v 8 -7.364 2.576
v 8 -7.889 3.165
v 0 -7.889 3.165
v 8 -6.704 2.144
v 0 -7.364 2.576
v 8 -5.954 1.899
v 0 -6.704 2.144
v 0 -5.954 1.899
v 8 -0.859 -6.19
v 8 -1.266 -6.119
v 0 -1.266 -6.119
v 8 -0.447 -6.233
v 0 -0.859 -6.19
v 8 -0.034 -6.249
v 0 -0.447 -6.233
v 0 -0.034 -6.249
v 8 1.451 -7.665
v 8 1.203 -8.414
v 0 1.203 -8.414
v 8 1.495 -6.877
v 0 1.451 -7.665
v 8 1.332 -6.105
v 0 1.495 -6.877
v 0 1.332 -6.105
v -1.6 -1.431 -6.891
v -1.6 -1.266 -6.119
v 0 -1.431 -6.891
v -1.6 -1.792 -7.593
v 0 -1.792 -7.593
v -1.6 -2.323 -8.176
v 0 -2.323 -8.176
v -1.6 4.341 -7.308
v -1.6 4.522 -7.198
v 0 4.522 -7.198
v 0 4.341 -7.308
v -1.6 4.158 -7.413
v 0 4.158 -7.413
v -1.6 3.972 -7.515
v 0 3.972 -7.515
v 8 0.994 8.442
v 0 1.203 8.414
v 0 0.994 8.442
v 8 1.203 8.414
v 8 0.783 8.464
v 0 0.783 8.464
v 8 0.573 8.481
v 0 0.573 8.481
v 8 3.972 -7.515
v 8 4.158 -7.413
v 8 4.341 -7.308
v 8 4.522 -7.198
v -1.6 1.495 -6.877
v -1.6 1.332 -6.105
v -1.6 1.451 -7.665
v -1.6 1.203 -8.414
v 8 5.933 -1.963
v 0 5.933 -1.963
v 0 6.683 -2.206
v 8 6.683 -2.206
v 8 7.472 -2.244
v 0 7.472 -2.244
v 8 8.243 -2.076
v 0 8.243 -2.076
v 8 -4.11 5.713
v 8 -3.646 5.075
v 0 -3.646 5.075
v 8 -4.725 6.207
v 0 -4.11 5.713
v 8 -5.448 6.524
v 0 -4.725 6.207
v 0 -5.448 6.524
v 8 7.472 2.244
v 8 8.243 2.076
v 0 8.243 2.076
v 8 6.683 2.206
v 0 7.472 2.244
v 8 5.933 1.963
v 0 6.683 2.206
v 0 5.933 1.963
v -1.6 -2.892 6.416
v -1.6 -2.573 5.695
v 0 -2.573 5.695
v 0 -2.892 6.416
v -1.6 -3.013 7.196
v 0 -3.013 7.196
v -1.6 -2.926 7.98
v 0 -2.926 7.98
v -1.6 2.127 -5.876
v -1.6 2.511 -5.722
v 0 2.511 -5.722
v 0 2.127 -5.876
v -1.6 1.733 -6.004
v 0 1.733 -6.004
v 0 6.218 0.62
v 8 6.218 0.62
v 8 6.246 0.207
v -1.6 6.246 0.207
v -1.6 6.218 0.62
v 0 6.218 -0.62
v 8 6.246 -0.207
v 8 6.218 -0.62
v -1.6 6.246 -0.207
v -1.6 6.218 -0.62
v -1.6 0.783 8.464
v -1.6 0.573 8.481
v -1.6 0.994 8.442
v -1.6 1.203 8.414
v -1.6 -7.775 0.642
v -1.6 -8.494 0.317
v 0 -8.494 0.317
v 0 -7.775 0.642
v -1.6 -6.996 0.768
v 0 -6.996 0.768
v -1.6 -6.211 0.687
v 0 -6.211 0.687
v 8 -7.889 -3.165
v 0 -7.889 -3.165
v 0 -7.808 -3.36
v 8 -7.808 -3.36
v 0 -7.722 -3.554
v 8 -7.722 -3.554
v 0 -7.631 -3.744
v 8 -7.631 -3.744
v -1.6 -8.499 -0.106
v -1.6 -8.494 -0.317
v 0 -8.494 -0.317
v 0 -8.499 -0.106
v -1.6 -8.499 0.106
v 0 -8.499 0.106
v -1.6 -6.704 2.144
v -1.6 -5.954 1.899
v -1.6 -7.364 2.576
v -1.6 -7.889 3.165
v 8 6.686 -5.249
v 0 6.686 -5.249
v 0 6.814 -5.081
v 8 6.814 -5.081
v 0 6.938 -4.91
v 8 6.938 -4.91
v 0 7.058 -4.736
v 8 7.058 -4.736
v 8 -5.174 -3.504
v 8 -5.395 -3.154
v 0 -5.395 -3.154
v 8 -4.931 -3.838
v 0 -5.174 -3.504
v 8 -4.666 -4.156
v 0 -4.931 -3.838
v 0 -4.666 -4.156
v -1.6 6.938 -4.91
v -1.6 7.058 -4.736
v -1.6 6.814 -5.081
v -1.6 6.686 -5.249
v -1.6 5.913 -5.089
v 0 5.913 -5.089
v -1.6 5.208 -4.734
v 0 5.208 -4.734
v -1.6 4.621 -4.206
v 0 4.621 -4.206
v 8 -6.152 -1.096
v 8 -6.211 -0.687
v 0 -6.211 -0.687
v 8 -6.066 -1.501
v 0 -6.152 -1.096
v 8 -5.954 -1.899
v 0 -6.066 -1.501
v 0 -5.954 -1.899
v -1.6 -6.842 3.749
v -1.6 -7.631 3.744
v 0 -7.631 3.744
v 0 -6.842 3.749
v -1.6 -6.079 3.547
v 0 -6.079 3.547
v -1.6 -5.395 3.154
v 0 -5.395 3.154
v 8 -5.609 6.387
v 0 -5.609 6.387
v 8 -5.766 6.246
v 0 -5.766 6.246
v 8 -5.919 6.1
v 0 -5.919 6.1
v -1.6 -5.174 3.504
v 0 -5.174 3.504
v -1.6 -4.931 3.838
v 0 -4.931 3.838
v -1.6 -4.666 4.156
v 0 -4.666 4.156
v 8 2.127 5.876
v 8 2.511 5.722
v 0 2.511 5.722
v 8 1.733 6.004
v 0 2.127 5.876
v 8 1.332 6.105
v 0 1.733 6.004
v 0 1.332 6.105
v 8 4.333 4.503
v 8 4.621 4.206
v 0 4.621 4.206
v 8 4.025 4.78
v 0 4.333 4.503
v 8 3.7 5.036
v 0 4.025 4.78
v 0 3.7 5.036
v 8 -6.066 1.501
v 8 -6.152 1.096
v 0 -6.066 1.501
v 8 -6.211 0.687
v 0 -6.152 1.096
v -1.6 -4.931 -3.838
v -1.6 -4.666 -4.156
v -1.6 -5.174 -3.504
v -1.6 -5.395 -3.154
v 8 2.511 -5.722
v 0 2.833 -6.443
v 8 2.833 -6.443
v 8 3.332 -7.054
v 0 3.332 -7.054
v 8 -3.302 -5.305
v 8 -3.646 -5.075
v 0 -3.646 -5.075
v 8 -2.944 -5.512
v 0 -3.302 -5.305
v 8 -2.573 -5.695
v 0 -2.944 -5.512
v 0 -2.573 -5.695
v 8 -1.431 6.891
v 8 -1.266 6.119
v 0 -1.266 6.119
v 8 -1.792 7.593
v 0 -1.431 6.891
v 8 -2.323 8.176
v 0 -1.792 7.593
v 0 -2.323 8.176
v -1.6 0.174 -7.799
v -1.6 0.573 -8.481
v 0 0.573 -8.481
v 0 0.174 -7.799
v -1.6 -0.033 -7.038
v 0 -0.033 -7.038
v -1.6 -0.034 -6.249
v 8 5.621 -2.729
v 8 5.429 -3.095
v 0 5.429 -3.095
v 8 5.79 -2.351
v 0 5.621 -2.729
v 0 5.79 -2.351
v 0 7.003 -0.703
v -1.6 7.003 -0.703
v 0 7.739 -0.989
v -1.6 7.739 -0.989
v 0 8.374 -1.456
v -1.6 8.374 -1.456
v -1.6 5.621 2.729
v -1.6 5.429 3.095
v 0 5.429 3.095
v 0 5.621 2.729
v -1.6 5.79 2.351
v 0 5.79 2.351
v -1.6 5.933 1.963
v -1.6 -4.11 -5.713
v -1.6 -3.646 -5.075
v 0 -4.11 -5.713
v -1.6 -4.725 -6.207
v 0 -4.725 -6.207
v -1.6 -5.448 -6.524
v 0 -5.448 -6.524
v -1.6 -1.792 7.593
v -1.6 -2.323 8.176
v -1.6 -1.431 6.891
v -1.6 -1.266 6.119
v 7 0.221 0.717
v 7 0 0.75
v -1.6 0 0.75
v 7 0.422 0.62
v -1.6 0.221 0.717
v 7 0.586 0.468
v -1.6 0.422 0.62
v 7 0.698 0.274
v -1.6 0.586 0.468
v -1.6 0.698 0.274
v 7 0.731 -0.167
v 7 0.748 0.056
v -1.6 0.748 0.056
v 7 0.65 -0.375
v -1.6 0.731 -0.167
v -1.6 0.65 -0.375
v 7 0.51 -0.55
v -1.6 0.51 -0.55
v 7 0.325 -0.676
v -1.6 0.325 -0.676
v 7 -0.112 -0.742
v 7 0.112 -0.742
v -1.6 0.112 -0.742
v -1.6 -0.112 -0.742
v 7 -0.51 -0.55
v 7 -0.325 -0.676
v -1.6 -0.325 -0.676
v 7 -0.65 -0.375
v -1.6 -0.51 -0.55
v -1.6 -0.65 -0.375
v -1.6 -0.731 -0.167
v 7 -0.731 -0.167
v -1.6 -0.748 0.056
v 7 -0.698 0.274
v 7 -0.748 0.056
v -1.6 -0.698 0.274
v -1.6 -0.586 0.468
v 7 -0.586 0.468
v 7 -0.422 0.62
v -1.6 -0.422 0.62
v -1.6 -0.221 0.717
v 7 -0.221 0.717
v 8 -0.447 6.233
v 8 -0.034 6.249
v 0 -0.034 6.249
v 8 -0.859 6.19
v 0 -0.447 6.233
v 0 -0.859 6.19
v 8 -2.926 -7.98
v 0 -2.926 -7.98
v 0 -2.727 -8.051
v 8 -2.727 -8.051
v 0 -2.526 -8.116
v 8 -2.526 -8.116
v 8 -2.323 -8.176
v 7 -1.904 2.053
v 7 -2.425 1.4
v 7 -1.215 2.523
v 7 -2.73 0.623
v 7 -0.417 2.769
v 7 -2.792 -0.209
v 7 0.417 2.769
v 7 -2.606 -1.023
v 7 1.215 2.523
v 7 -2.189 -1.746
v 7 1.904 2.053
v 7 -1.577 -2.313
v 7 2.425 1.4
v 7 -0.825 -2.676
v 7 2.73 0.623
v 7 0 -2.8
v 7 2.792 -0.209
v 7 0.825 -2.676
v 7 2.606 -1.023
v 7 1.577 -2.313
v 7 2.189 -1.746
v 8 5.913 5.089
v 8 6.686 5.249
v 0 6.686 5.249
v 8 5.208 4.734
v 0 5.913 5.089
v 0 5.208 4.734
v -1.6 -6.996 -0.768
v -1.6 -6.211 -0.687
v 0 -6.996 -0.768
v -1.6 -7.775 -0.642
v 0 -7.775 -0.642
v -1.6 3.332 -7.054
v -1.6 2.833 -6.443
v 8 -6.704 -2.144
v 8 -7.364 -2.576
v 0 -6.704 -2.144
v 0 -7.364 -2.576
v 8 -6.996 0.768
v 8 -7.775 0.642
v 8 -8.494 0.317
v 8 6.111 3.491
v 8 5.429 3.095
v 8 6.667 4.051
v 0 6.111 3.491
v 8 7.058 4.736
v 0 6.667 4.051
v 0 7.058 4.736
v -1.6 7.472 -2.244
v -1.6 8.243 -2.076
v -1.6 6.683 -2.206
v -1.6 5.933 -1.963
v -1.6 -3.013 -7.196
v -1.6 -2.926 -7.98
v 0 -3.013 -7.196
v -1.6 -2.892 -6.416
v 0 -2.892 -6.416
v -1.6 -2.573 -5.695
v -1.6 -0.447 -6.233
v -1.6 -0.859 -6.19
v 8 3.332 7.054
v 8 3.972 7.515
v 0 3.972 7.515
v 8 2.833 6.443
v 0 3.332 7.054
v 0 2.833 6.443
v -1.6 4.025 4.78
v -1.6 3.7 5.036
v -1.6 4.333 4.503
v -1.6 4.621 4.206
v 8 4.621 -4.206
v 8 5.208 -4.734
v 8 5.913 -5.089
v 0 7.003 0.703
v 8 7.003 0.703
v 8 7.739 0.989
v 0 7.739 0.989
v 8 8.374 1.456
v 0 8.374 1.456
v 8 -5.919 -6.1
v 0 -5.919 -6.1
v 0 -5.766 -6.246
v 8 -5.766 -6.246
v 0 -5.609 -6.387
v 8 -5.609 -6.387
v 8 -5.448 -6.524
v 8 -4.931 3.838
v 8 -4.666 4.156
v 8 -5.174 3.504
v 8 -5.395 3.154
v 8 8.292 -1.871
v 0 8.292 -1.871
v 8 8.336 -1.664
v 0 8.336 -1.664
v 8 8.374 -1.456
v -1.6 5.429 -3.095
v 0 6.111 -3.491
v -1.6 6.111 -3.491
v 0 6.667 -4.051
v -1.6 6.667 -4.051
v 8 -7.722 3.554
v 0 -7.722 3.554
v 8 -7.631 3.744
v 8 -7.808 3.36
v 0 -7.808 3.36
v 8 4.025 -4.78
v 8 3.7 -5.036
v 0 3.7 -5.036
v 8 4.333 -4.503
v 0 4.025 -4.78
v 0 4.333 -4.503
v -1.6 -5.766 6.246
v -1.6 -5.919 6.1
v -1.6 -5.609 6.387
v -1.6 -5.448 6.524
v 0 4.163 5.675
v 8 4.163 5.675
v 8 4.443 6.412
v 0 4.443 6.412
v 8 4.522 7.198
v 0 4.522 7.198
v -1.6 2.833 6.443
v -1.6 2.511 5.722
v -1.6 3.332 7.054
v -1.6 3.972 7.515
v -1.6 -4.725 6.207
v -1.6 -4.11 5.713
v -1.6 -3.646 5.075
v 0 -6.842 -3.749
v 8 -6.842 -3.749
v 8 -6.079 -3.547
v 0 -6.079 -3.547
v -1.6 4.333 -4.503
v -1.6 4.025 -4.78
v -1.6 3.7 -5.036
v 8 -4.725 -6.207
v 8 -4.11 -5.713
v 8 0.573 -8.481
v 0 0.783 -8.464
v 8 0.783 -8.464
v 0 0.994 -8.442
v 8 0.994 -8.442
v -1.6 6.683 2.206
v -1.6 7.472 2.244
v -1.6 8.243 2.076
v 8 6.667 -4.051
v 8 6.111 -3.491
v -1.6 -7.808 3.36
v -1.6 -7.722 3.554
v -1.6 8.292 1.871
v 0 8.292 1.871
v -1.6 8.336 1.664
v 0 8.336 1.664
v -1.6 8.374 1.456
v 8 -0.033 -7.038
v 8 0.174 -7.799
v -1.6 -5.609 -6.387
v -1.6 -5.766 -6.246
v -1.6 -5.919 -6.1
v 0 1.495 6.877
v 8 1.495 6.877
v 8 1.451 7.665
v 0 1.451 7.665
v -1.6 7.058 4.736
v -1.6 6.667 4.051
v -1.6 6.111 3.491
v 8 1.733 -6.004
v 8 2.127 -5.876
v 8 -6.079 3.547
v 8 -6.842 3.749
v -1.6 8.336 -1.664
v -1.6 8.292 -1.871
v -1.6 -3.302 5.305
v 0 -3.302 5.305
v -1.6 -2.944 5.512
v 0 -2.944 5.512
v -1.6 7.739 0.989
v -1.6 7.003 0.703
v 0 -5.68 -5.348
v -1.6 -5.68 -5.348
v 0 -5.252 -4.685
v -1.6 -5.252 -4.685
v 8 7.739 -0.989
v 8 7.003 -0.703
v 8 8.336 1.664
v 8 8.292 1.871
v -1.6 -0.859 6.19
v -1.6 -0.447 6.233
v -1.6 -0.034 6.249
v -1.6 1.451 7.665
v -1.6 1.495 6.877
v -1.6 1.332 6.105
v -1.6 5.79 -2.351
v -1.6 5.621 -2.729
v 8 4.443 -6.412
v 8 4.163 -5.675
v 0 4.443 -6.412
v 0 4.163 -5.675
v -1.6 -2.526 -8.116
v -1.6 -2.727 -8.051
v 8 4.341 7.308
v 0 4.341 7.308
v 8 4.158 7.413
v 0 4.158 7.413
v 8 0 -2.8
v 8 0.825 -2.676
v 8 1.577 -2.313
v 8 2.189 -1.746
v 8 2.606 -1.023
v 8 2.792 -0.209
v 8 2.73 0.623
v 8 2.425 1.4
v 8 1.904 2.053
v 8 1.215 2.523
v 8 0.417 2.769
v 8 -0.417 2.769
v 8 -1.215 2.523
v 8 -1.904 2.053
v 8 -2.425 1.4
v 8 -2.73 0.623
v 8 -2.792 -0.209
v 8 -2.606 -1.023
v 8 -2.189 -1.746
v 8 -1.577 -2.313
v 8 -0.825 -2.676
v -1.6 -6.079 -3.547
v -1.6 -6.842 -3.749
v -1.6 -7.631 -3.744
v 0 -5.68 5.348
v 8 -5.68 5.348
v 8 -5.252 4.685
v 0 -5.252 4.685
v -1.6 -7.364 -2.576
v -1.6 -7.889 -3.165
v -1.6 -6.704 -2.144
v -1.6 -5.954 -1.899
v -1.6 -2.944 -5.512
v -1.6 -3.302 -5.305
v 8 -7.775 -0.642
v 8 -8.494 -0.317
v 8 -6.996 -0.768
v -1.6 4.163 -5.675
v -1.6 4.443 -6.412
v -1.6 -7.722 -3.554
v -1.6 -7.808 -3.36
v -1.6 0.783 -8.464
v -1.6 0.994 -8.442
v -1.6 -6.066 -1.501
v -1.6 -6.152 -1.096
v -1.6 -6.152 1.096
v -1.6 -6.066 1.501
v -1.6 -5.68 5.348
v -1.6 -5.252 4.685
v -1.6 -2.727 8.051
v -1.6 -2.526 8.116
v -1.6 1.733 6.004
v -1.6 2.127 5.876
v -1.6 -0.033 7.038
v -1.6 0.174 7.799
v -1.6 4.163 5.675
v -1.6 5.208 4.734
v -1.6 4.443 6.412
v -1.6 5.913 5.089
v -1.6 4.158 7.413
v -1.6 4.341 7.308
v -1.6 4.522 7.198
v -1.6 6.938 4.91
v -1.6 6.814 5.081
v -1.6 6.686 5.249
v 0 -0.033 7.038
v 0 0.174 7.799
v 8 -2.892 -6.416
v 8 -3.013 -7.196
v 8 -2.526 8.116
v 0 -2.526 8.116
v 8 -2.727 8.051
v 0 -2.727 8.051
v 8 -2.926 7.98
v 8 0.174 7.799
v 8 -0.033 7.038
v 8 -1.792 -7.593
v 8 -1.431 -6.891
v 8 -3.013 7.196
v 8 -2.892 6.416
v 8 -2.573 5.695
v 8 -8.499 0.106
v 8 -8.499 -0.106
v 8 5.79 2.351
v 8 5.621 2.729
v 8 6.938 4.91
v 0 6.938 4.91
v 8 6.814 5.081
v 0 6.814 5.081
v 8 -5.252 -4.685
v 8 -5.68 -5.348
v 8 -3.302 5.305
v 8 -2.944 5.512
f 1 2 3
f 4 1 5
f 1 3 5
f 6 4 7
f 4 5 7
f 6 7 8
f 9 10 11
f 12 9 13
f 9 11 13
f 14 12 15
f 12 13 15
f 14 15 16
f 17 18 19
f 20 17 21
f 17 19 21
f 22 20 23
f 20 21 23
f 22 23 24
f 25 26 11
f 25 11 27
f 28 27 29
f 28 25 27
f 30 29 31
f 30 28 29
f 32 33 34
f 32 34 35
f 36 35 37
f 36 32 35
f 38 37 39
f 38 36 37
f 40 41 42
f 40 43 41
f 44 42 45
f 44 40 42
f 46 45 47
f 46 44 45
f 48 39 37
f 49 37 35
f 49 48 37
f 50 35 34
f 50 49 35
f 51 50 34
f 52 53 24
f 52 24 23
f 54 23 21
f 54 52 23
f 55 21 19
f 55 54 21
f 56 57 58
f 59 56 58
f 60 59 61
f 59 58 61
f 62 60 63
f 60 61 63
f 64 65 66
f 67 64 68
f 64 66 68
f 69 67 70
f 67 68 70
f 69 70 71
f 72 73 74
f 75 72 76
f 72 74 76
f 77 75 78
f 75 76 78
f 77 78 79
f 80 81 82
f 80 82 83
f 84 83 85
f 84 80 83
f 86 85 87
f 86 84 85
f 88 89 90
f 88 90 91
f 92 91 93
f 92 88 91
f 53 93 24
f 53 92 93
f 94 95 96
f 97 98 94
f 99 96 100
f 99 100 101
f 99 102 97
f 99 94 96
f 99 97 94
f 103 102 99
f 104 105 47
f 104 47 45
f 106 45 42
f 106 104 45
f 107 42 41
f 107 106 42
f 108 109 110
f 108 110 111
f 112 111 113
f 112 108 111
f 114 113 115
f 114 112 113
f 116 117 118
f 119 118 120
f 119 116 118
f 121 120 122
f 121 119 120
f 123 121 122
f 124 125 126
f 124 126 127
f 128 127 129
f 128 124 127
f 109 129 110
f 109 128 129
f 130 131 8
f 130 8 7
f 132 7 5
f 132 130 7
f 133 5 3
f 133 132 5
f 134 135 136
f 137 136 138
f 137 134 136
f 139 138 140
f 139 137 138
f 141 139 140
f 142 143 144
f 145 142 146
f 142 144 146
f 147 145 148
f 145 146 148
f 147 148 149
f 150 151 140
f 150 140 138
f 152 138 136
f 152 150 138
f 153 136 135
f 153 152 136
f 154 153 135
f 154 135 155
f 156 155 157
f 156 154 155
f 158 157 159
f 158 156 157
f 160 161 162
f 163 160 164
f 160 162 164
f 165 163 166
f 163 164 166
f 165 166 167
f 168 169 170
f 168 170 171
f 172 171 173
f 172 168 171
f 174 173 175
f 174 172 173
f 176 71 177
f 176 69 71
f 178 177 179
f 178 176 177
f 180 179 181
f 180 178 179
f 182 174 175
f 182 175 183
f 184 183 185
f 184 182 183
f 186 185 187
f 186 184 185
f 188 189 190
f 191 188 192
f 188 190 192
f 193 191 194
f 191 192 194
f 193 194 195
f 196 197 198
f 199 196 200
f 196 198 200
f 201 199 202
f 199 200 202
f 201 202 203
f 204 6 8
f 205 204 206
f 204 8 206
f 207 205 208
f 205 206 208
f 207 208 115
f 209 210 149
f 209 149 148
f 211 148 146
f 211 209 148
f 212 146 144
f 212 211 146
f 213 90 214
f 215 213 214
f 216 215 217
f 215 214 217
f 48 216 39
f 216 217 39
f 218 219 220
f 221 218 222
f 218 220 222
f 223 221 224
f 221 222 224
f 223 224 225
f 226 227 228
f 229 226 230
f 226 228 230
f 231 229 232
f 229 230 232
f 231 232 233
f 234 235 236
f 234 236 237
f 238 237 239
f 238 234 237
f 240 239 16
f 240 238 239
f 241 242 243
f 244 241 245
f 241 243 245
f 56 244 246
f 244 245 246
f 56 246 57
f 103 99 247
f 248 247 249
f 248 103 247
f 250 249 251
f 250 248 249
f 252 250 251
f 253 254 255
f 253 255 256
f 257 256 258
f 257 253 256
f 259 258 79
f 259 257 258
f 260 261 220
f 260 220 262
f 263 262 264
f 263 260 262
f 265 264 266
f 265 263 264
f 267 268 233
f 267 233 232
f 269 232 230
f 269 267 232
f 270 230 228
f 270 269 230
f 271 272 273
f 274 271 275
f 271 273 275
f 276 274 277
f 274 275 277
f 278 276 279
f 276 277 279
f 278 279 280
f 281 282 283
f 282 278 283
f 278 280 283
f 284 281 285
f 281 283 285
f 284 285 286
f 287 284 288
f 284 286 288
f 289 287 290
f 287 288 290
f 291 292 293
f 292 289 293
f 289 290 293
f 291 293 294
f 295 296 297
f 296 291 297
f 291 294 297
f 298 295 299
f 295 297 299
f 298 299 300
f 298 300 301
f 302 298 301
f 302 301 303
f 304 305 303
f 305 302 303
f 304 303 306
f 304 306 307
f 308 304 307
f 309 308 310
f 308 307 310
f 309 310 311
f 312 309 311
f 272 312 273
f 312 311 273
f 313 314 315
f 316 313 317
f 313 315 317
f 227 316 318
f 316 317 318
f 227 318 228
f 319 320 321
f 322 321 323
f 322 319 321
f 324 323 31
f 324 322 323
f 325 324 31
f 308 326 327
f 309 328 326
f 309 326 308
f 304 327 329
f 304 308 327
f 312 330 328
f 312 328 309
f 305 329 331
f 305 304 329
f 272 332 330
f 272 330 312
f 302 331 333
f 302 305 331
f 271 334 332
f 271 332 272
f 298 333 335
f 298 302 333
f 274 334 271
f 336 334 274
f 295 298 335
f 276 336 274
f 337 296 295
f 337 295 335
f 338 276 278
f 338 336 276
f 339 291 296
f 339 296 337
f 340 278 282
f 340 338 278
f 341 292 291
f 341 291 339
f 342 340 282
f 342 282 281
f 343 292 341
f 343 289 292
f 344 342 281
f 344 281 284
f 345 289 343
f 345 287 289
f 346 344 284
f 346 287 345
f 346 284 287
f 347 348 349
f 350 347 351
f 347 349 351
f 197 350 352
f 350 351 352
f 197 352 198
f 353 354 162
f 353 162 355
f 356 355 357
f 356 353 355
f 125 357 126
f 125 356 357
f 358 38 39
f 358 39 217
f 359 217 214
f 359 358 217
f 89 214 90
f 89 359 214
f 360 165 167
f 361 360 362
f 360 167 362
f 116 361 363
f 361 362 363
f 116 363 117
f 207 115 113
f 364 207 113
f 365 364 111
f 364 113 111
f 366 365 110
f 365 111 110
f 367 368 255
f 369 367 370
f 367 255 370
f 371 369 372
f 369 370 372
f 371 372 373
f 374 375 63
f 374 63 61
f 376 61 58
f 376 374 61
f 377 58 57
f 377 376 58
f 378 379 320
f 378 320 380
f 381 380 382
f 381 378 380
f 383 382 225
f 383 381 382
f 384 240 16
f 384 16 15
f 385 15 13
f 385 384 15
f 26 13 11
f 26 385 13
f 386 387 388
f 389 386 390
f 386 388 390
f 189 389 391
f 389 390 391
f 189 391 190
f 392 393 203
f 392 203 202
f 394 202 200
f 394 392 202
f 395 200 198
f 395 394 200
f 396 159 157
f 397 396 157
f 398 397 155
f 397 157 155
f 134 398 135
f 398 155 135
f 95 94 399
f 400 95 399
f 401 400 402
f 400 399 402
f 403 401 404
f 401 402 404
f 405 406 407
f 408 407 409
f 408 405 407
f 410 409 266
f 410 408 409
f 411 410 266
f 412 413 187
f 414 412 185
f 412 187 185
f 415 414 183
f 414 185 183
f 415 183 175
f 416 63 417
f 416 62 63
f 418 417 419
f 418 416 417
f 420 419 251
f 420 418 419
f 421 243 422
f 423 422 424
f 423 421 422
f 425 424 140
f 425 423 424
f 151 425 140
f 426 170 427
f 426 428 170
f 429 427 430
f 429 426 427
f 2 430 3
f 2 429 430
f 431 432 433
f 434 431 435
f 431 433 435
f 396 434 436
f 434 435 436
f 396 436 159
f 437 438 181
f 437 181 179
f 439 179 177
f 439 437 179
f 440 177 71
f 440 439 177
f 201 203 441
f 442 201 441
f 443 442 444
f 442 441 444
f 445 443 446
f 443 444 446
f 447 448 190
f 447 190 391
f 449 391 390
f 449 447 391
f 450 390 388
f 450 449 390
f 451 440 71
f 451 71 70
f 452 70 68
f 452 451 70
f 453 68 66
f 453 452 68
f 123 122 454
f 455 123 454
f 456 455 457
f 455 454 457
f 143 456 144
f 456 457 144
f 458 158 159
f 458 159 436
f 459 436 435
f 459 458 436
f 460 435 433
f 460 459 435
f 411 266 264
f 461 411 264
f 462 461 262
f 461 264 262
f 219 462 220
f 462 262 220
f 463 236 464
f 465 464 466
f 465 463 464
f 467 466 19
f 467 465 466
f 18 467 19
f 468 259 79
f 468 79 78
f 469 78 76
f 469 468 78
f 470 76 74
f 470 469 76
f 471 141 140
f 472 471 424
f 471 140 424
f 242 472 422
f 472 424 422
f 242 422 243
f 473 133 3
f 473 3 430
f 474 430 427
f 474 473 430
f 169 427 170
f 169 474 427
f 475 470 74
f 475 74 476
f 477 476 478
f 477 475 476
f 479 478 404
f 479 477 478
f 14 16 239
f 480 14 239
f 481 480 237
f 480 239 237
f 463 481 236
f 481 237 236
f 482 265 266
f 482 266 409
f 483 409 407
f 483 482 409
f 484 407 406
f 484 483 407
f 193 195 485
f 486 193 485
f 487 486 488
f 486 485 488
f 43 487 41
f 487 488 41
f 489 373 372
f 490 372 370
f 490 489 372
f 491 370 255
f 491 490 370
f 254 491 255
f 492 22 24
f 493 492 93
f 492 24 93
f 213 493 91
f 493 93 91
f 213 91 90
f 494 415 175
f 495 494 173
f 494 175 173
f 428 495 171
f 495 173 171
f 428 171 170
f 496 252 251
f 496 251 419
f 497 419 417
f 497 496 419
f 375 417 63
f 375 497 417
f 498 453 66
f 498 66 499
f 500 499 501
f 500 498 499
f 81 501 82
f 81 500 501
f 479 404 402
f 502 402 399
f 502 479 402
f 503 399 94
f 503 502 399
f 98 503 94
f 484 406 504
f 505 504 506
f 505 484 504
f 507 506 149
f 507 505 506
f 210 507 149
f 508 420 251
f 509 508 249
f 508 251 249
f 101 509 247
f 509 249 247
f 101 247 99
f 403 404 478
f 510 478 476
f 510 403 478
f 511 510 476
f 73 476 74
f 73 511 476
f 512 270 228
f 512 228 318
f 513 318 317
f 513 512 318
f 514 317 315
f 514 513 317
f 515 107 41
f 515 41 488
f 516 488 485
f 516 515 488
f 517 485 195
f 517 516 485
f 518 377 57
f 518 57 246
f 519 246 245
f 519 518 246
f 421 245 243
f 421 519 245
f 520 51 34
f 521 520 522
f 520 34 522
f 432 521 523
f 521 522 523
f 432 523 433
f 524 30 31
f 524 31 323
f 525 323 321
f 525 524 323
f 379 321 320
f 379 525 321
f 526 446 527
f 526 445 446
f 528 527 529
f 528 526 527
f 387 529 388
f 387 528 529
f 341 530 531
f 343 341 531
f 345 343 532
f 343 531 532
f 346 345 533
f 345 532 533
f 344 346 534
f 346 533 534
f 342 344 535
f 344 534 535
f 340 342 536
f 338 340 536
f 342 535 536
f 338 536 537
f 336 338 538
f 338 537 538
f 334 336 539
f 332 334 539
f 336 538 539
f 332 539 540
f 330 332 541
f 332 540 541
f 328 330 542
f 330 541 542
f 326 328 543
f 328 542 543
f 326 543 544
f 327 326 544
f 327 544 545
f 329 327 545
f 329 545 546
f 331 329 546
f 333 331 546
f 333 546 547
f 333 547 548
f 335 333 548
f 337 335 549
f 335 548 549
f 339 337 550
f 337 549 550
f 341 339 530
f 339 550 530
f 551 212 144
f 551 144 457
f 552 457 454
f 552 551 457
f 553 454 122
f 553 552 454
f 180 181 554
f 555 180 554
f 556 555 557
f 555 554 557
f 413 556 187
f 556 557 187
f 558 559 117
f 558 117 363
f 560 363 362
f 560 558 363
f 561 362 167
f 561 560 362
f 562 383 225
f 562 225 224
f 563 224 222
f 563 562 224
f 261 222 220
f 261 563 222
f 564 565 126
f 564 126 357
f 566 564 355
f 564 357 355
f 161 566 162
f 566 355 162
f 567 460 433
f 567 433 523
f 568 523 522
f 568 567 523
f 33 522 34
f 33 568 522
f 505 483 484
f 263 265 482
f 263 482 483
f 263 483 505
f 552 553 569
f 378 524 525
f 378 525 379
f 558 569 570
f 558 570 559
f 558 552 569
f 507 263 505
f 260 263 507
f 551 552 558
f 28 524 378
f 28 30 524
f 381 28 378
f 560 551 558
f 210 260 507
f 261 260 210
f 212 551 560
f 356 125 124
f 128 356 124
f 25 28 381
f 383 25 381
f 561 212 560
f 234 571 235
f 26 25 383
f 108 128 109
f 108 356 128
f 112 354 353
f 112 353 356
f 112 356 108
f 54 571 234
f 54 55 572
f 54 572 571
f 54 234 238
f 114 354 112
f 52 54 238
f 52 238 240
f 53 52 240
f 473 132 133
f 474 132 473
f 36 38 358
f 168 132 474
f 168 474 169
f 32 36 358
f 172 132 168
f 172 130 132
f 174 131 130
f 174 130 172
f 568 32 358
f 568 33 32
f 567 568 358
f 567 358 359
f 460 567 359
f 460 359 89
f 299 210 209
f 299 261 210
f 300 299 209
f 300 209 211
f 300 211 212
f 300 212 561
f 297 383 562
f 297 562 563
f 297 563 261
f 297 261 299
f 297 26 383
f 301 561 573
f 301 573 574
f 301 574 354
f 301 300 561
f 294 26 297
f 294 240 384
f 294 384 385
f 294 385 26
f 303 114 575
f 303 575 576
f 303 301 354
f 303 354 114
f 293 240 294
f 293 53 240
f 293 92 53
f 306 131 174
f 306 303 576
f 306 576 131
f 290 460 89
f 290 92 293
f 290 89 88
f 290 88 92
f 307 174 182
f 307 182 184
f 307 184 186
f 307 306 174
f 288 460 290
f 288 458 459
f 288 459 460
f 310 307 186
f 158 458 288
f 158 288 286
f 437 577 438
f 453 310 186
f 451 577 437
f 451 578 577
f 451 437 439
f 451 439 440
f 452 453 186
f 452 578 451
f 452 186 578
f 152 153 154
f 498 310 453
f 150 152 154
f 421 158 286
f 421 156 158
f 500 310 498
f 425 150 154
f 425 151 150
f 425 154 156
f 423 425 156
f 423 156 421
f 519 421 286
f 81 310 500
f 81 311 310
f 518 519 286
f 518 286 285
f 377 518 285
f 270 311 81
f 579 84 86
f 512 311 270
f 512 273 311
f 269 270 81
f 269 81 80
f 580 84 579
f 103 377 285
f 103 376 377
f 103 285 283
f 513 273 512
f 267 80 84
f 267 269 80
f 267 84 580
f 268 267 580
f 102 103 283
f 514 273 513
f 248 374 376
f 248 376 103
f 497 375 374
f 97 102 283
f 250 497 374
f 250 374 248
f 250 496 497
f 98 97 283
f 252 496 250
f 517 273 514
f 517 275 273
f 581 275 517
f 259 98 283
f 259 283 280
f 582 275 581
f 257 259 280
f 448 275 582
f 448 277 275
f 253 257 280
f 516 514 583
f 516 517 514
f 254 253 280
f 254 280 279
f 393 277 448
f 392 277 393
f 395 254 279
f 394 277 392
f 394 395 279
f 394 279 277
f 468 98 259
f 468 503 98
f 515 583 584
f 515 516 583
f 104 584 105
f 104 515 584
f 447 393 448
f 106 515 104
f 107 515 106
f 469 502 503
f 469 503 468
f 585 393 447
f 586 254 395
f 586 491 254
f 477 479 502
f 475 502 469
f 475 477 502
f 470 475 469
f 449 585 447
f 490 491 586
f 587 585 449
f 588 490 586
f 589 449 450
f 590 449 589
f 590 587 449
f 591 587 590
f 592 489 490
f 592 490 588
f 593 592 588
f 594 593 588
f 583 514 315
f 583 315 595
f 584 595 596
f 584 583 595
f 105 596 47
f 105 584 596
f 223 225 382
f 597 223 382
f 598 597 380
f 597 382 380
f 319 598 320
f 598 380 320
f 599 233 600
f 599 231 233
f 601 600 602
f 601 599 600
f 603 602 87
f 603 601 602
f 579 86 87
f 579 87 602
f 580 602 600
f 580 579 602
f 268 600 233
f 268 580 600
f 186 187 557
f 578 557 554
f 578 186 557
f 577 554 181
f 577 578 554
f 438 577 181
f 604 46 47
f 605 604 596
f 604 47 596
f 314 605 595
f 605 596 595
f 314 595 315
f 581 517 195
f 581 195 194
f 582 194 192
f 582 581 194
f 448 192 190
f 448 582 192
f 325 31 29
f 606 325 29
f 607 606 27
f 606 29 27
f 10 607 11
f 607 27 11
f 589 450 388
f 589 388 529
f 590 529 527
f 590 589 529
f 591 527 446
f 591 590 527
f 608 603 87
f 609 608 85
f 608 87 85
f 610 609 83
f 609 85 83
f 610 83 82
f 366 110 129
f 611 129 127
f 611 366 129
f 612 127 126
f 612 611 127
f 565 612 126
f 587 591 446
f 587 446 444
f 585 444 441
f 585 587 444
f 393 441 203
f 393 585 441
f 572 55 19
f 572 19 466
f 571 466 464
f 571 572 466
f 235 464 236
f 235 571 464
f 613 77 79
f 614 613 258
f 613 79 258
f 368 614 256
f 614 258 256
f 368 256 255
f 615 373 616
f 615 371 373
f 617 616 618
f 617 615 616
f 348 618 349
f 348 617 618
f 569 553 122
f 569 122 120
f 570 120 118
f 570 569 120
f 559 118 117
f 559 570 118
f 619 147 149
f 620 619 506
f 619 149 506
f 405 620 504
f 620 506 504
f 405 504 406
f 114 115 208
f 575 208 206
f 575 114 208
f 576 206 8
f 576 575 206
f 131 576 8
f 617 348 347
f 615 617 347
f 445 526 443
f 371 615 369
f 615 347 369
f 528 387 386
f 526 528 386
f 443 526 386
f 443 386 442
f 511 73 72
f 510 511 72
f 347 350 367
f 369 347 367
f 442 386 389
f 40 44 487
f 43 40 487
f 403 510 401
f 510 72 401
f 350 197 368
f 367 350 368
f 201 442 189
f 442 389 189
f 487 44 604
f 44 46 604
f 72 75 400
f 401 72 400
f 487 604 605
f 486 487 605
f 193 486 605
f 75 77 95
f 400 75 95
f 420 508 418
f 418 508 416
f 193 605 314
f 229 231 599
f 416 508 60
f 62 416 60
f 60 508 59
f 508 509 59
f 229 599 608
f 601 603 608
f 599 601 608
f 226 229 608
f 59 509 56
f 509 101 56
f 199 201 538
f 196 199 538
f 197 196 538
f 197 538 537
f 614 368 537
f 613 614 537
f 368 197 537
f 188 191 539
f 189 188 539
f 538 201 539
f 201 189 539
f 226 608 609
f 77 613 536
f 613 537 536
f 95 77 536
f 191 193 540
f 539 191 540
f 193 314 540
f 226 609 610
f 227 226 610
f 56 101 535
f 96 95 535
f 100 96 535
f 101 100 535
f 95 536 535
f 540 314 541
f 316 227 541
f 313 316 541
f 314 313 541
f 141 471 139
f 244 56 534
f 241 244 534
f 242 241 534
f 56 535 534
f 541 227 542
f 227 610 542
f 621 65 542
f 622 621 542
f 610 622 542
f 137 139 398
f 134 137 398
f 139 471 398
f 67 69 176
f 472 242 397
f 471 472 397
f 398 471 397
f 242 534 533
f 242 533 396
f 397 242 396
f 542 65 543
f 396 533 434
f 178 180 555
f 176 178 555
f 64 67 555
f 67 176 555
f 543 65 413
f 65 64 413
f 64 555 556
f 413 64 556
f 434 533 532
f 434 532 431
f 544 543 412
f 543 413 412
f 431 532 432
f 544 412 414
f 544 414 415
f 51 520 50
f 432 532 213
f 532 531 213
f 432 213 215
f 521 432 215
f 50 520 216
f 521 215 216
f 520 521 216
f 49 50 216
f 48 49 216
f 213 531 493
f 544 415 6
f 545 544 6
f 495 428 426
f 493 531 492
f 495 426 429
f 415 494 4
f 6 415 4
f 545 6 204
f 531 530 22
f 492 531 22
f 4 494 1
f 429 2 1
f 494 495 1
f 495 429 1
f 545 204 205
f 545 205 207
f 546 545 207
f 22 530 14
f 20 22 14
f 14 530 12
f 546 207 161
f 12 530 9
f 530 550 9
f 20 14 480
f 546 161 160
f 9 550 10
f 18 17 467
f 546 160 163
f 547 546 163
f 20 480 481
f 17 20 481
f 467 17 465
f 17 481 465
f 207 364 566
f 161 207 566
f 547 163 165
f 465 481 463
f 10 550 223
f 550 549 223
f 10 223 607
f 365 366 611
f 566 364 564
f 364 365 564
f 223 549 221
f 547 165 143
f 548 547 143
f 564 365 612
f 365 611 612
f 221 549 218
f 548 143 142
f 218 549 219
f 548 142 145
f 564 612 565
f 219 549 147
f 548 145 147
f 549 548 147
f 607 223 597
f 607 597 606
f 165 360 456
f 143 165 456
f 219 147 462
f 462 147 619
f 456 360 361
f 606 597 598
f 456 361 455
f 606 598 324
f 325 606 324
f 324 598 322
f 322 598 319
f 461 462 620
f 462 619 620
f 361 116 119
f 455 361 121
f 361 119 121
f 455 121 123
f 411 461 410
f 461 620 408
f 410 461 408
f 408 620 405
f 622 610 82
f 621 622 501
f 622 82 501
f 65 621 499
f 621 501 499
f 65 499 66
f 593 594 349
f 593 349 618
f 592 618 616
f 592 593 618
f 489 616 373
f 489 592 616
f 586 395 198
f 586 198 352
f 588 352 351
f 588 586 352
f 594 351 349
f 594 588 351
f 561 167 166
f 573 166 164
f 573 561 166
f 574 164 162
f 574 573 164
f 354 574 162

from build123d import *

# Parameters (mm, degrees)
BASPROSKE_W         = 8
BASPROSKE_H         = 8.5
TOOTHCUT_DEPTH      = 15.439529078
TEETHCUTS_COUNT     = 15
TEETHCUTS_ANGLE     = 336
BORSKE_R            = 0.75
BORE_DEPTH          = 50.0000508
SKETCH1_R           = 2.8
CUT_EXTRUDE2_DEPTH  = 1
BOSS_EXTRUDE2_START = 1.6
SKETCH2_R           = 0.75
BOSS_EXTRUDE2_DEPTH = 1.6


with BuildPart() as part:
    # BasProSke → Base-Revolve (revolve)
    with BuildSketch(Plane(origin=(0, 0, 0), x_dir=(1, 0, 0), z_dir=(0, 1, 0)), mode=Mode.PRIVATE) as base_revolve_sk:
        with Locations((4, 4.25)):
            Rectangle(BASPROSKE_W, BASPROSKE_H)
    revolve(base_revolve_sk.sketch.rotate(Axis((-10, 0, 0), (1, 0, 0)), 180), axis=Axis((-10, 0, 0), (1, 0, 0)))

    # TooCutSke → ToothCut (cut, through all)
    with BuildSketch(Plane(origin=(0, 0, 0), x_dir=(0, 0, -1), z_dir=(1, 0, 0))):
        with BuildLine():
            ThreePointArc((0.619547138, 6.21821215), (0, 6.249), (-0.619547138, 6.21821215))
            ThreePointArc((-0.619547138, 6.21821215), (-0.827197364, 7.394441061), (-1.477319646, 8.396426134))
            ThreePointArc((-1.477319646, 8.396426134), (0, 8.5254), (1.477319646, 8.396426134))
            ThreePointArc((1.477319646, 8.396426134), (0.827197364, 7.394441061), (0.619547138, 6.21821215))
        make_face()
    toothcut = extrude(amount=TOOTHCUT_DEPTH, mode=Mode.SUBTRACT)

    # TeethCuts: ToothCut ×15 about axis
    teethcuts_axis = Axis((-10, 0, 0), (1, 0, 0))
    for i in range(1, TEETHCUTS_COUNT):
        add(toothcut.rotate(teethcuts_axis, i * TEETHCUTS_ANGLE / (TEETHCUTS_COUNT - 1)), mode=Mode.SUBTRACT)

    # BorSke → Bore (cut, symmetric)
    with BuildSketch(Plane(origin=(0, 0, 0), x_dir=(0, 0, -1), z_dir=(1, 0, 0))):
        with Locations(Location((0, 0, 0), (0, 0, 180))):
            Circle(BORSKE_R)
    extrude(amount=BORE_DEPTH, both=True, mode=Mode.SUBTRACT)

    # Sketch1 → Cut-Extrude2 (cut)
    with BuildSketch(Plane(origin=(8, 0, 0), x_dir=(0, 0, -1), z_dir=(1, 0, 0))):
        Circle(SKETCH1_R)
    extrude(amount=-CUT_EXTRUDE2_DEPTH, mode=Mode.SUBTRACT)

    # Sketch2 → Boss-Extrude2 (add)
    with BuildSketch(Plane.ZY.offset(BOSS_EXTRUDE2_START)):
        with BuildLine():
            ThreePointArc((6.248908444, -0.033826967), (7.425583576, 0.045669992), (8.480693328, 0.572573726))
            ThreePointArc((8.480693328, 0.572573726), (8.453436111, 0.888491938), (8.414414603, 1.203173673))
            ThreePointArc((8.414414603, 1.203173673), (7.272812084, 1.499193643), (6.105321779, 1.332308887))
            ThreePointArc((6.105321779, 1.332308887), (5.94315217, 1.931047198), (5.722420591, 2.510757571))
            ThreePointArc((5.722420591, 2.510757571), (6.765032487, 3.061978551), (7.514612153, 3.972480862))
            ThreePointArc((7.514612153, 3.972480862), (7.361215932, 4.25), (7.197575419, 4.521604593))
            ThreePointArc((7.197575419, 4.521604593), (6.034267454, 4.327700716), (5.035590135, 3.700382817))
            ThreePointArc((5.035590135, 3.700382817), (4.643912014, 4.181397159), (4.206474231, 4.621209316))
            ThreePointArc((4.206474231, 4.621209316), (4.934745822, 5.5488432), (5.249186267, 6.685509968))
            ThreePointArc((5.249186267, 6.685509968), (4.996174644, 6.876644452), (4.736210056, 7.058209001))
            ThreePointArc((4.736210056, 7.058209001), (3.752343161, 6.407909019), (3.095159209, 5.428626941))
            ThreePointArc((3.095159209, 5.428626941), (2.541697283, 5.708745565), (1.963190262, 5.932611987))
            ThreePointArc((1.963190262, 5.932611987), (2.251196774, 7.076262451), (2.076128389, 8.242553664))
            ThreePointArc((2.076128389, 8.242553664), (1.767249372, 8.314254606), (1.455910948, 8.374384951))
            ThreePointArc((1.455910948, 8.374384951), (0.821604647, 7.380131638), (0.619547138, 6.21821215))
            ThreePointArc((0.619547138, 6.21821215), (0, 6.249), (-0.619547138, 6.21821215))
            ThreePointArc((-0.619547138, 6.21821215), (-0.821604647, 7.380131638), (-1.455910948, 8.374384951))
            ThreePointArc((-1.455910948, 8.374384951), (-1.767249372, 8.314254606), (-2.076128389, 8.242553664))
            ThreePointArc((-2.076128389, 8.242553664), (-2.251196774, 7.076262451), (-1.963190262, 5.932611987))
            ThreePointArc((-1.963190262, 5.932611987), (-2.541697283, 5.708745565), (-3.095159209, 5.428626941))
            ThreePointArc((-3.095159209, 5.428626941), (-3.752343161, 6.407909019), (-4.736210056, 7.058209001))
            ThreePointArc((-4.736210056, 7.058209001), (-4.996174644, 6.876644452), (-5.249186267, 6.685509968))
            ThreePointArc((-5.249186267, 6.685509968), (-4.934745822, 5.5488432), (-4.206474231, 4.621209316))
            ThreePointArc((-4.206474231, 4.621209316), (-4.643912014, 4.181397159), (-5.035590135, 3.700382817))
            ThreePointArc((-5.035590135, 3.700382817), (-6.034267454, 4.327700716), (-7.197575419, 4.521604593))
            ThreePointArc((-7.197575419, 4.521604593), (-7.361215932, 4.25), (-7.514612153, 3.972480862))
            ThreePointArc((-7.514612153, 3.972480862), (-6.765032487, 3.061978551), (-5.722420591, 2.510757571))
            ThreePointArc((-5.722420591, 2.510757571), (-5.94315217, 1.931047198), (-6.105321779, 1.332308887))
            ThreePointArc((-6.105321779, 1.332308887), (-7.272812084, 1.499193643), (-8.414414603, 1.203173673))
            ThreePointArc((-8.414414603, 1.203173673), (-8.453436111, 0.888491938), (-8.480693328, 0.572573726))
            ThreePointArc((-8.480693328, 0.572573726), (-7.425583576, 0.045669992), (-6.248908444, -0.033826967))
            ThreePointArc((-6.248908444, -0.033826967), (-6.214767324, -0.653198367), (-6.119387823, -1.266133354))
            ThreePointArc((-6.119387823, -1.266133354), (-7.253821434, -1.58853763), (-8.17632506, -2.323296905))
            ThreePointArc((-8.17632506, -2.323296905), (-8.083980389, -2.626644452), (-7.980385583, -2.926336609))
            ThreePointArc((-7.980385583, -2.926336609), (-6.802183806, -2.978535323), (-5.694903257, -2.572562515))
            ThreePointArc((-5.694903257, -2.572562515), (-5.411792748, -3.1245), (-5.075356119, -3.645649635))
            ThreePointArc((-5.075356119, -3.645649635), (-5.980579158, -4.401596316), (-6.524474635, -5.448048342))
            ThreePointArc((-6.524474635, -5.448048342), (-6.316731017, -5.687610154), (-6.100196671, -5.919256759))
            ThreePointArc((-6.100196671, -5.919256759), (-5.002624659, -5.487724821), (-4.156197561, -4.666478633))
            ThreePointArc((-4.156197561, -4.666478633), (-3.673070042, -5.055547198), (-3.153749234, -5.394799975))
            ThreePointArc((-3.153749234, -5.394799975), (-3.673240415, -6.453579011), (-3.744483272, -7.630782727))
            ThreePointArc((-3.744483272, -7.630782727), (-3.457261466, -7.76513639), (-3.165228336, -7.888683641))
            ThreePointArc((-3.165228336, -7.888683641), (-2.338066262, -7.048036844), (-1.898847548, -5.953518203))
            ThreePointArc((-1.898847548, -5.953518203), (-1.299240156, -6.112444357), (-0.686830456, -6.211140388))
            ThreePointArc((-0.686830456, -6.211140388), (-0.730765033, -7.389679266), (-0.317036734, -8.494085455))
            ThreePointArc((-0.317036734, -8.494085455), (0, -8.5), (0.317036734, -8.494085455))
            ThreePointArc((0.317036734, -8.494085455), (0.730765033, -7.389679266), (0.686830456, -6.211140388))
            ThreePointArc((0.686830456, -6.211140388), (1.299240156, -6.112444357), (1.898847548, -5.953518203))
            ThreePointArc((1.898847548, -5.953518203), (2.338066262, -7.048036844), (3.165228336, -7.888683641))
            ThreePointArc((3.165228336, -7.888683641), (3.457261466, -7.76513639), (3.744483272, -7.630782727))
            ThreePointArc((3.744483272, -7.630782727), (3.673240415, -6.453579011), (3.153749234, -5.394799975))
            ThreePointArc((3.153749234, -5.394799975), (3.673070042, -5.055547198), (4.156197561, -4.666478633))
            ThreePointArc((4.156197561, -4.666478633), (5.002624659, -5.487724821), (6.100196671, -5.919256759))
            ThreePointArc((6.100196671, -5.919256759), (6.316731017, -5.687610154), (6.524474635, -5.448048342))
            ThreePointArc((6.524474635, -5.448048342), (5.980579158, -4.401596316), (5.075356119, -3.645649635))
            ThreePointArc((5.075356119, -3.645649635), (5.411792748, -3.1245), (5.694903257, -2.572562515))
            ThreePointArc((5.694903257, -2.572562515), (6.802183806, -2.978535323), (7.980385583, -2.926336609))
            ThreePointArc((7.980385583, -2.926336609), (8.083980389, -2.626644452), (8.17632506, -2.323296905))
            ThreePointArc((8.17632506, -2.323296905), (7.253821434, -1.58853763), (6.119387823, -1.266133354))
            ThreePointArc((6.119387823, -1.266133354), (6.214767324, -0.653198367), (6.248908444, -0.033826967))
        make_face()
        Circle(SKETCH2_R, mode=Mode.SUBTRACT)
    extrude(amount=-BOSS_EXTRUDE2_DEPTH)


solid = part.part
